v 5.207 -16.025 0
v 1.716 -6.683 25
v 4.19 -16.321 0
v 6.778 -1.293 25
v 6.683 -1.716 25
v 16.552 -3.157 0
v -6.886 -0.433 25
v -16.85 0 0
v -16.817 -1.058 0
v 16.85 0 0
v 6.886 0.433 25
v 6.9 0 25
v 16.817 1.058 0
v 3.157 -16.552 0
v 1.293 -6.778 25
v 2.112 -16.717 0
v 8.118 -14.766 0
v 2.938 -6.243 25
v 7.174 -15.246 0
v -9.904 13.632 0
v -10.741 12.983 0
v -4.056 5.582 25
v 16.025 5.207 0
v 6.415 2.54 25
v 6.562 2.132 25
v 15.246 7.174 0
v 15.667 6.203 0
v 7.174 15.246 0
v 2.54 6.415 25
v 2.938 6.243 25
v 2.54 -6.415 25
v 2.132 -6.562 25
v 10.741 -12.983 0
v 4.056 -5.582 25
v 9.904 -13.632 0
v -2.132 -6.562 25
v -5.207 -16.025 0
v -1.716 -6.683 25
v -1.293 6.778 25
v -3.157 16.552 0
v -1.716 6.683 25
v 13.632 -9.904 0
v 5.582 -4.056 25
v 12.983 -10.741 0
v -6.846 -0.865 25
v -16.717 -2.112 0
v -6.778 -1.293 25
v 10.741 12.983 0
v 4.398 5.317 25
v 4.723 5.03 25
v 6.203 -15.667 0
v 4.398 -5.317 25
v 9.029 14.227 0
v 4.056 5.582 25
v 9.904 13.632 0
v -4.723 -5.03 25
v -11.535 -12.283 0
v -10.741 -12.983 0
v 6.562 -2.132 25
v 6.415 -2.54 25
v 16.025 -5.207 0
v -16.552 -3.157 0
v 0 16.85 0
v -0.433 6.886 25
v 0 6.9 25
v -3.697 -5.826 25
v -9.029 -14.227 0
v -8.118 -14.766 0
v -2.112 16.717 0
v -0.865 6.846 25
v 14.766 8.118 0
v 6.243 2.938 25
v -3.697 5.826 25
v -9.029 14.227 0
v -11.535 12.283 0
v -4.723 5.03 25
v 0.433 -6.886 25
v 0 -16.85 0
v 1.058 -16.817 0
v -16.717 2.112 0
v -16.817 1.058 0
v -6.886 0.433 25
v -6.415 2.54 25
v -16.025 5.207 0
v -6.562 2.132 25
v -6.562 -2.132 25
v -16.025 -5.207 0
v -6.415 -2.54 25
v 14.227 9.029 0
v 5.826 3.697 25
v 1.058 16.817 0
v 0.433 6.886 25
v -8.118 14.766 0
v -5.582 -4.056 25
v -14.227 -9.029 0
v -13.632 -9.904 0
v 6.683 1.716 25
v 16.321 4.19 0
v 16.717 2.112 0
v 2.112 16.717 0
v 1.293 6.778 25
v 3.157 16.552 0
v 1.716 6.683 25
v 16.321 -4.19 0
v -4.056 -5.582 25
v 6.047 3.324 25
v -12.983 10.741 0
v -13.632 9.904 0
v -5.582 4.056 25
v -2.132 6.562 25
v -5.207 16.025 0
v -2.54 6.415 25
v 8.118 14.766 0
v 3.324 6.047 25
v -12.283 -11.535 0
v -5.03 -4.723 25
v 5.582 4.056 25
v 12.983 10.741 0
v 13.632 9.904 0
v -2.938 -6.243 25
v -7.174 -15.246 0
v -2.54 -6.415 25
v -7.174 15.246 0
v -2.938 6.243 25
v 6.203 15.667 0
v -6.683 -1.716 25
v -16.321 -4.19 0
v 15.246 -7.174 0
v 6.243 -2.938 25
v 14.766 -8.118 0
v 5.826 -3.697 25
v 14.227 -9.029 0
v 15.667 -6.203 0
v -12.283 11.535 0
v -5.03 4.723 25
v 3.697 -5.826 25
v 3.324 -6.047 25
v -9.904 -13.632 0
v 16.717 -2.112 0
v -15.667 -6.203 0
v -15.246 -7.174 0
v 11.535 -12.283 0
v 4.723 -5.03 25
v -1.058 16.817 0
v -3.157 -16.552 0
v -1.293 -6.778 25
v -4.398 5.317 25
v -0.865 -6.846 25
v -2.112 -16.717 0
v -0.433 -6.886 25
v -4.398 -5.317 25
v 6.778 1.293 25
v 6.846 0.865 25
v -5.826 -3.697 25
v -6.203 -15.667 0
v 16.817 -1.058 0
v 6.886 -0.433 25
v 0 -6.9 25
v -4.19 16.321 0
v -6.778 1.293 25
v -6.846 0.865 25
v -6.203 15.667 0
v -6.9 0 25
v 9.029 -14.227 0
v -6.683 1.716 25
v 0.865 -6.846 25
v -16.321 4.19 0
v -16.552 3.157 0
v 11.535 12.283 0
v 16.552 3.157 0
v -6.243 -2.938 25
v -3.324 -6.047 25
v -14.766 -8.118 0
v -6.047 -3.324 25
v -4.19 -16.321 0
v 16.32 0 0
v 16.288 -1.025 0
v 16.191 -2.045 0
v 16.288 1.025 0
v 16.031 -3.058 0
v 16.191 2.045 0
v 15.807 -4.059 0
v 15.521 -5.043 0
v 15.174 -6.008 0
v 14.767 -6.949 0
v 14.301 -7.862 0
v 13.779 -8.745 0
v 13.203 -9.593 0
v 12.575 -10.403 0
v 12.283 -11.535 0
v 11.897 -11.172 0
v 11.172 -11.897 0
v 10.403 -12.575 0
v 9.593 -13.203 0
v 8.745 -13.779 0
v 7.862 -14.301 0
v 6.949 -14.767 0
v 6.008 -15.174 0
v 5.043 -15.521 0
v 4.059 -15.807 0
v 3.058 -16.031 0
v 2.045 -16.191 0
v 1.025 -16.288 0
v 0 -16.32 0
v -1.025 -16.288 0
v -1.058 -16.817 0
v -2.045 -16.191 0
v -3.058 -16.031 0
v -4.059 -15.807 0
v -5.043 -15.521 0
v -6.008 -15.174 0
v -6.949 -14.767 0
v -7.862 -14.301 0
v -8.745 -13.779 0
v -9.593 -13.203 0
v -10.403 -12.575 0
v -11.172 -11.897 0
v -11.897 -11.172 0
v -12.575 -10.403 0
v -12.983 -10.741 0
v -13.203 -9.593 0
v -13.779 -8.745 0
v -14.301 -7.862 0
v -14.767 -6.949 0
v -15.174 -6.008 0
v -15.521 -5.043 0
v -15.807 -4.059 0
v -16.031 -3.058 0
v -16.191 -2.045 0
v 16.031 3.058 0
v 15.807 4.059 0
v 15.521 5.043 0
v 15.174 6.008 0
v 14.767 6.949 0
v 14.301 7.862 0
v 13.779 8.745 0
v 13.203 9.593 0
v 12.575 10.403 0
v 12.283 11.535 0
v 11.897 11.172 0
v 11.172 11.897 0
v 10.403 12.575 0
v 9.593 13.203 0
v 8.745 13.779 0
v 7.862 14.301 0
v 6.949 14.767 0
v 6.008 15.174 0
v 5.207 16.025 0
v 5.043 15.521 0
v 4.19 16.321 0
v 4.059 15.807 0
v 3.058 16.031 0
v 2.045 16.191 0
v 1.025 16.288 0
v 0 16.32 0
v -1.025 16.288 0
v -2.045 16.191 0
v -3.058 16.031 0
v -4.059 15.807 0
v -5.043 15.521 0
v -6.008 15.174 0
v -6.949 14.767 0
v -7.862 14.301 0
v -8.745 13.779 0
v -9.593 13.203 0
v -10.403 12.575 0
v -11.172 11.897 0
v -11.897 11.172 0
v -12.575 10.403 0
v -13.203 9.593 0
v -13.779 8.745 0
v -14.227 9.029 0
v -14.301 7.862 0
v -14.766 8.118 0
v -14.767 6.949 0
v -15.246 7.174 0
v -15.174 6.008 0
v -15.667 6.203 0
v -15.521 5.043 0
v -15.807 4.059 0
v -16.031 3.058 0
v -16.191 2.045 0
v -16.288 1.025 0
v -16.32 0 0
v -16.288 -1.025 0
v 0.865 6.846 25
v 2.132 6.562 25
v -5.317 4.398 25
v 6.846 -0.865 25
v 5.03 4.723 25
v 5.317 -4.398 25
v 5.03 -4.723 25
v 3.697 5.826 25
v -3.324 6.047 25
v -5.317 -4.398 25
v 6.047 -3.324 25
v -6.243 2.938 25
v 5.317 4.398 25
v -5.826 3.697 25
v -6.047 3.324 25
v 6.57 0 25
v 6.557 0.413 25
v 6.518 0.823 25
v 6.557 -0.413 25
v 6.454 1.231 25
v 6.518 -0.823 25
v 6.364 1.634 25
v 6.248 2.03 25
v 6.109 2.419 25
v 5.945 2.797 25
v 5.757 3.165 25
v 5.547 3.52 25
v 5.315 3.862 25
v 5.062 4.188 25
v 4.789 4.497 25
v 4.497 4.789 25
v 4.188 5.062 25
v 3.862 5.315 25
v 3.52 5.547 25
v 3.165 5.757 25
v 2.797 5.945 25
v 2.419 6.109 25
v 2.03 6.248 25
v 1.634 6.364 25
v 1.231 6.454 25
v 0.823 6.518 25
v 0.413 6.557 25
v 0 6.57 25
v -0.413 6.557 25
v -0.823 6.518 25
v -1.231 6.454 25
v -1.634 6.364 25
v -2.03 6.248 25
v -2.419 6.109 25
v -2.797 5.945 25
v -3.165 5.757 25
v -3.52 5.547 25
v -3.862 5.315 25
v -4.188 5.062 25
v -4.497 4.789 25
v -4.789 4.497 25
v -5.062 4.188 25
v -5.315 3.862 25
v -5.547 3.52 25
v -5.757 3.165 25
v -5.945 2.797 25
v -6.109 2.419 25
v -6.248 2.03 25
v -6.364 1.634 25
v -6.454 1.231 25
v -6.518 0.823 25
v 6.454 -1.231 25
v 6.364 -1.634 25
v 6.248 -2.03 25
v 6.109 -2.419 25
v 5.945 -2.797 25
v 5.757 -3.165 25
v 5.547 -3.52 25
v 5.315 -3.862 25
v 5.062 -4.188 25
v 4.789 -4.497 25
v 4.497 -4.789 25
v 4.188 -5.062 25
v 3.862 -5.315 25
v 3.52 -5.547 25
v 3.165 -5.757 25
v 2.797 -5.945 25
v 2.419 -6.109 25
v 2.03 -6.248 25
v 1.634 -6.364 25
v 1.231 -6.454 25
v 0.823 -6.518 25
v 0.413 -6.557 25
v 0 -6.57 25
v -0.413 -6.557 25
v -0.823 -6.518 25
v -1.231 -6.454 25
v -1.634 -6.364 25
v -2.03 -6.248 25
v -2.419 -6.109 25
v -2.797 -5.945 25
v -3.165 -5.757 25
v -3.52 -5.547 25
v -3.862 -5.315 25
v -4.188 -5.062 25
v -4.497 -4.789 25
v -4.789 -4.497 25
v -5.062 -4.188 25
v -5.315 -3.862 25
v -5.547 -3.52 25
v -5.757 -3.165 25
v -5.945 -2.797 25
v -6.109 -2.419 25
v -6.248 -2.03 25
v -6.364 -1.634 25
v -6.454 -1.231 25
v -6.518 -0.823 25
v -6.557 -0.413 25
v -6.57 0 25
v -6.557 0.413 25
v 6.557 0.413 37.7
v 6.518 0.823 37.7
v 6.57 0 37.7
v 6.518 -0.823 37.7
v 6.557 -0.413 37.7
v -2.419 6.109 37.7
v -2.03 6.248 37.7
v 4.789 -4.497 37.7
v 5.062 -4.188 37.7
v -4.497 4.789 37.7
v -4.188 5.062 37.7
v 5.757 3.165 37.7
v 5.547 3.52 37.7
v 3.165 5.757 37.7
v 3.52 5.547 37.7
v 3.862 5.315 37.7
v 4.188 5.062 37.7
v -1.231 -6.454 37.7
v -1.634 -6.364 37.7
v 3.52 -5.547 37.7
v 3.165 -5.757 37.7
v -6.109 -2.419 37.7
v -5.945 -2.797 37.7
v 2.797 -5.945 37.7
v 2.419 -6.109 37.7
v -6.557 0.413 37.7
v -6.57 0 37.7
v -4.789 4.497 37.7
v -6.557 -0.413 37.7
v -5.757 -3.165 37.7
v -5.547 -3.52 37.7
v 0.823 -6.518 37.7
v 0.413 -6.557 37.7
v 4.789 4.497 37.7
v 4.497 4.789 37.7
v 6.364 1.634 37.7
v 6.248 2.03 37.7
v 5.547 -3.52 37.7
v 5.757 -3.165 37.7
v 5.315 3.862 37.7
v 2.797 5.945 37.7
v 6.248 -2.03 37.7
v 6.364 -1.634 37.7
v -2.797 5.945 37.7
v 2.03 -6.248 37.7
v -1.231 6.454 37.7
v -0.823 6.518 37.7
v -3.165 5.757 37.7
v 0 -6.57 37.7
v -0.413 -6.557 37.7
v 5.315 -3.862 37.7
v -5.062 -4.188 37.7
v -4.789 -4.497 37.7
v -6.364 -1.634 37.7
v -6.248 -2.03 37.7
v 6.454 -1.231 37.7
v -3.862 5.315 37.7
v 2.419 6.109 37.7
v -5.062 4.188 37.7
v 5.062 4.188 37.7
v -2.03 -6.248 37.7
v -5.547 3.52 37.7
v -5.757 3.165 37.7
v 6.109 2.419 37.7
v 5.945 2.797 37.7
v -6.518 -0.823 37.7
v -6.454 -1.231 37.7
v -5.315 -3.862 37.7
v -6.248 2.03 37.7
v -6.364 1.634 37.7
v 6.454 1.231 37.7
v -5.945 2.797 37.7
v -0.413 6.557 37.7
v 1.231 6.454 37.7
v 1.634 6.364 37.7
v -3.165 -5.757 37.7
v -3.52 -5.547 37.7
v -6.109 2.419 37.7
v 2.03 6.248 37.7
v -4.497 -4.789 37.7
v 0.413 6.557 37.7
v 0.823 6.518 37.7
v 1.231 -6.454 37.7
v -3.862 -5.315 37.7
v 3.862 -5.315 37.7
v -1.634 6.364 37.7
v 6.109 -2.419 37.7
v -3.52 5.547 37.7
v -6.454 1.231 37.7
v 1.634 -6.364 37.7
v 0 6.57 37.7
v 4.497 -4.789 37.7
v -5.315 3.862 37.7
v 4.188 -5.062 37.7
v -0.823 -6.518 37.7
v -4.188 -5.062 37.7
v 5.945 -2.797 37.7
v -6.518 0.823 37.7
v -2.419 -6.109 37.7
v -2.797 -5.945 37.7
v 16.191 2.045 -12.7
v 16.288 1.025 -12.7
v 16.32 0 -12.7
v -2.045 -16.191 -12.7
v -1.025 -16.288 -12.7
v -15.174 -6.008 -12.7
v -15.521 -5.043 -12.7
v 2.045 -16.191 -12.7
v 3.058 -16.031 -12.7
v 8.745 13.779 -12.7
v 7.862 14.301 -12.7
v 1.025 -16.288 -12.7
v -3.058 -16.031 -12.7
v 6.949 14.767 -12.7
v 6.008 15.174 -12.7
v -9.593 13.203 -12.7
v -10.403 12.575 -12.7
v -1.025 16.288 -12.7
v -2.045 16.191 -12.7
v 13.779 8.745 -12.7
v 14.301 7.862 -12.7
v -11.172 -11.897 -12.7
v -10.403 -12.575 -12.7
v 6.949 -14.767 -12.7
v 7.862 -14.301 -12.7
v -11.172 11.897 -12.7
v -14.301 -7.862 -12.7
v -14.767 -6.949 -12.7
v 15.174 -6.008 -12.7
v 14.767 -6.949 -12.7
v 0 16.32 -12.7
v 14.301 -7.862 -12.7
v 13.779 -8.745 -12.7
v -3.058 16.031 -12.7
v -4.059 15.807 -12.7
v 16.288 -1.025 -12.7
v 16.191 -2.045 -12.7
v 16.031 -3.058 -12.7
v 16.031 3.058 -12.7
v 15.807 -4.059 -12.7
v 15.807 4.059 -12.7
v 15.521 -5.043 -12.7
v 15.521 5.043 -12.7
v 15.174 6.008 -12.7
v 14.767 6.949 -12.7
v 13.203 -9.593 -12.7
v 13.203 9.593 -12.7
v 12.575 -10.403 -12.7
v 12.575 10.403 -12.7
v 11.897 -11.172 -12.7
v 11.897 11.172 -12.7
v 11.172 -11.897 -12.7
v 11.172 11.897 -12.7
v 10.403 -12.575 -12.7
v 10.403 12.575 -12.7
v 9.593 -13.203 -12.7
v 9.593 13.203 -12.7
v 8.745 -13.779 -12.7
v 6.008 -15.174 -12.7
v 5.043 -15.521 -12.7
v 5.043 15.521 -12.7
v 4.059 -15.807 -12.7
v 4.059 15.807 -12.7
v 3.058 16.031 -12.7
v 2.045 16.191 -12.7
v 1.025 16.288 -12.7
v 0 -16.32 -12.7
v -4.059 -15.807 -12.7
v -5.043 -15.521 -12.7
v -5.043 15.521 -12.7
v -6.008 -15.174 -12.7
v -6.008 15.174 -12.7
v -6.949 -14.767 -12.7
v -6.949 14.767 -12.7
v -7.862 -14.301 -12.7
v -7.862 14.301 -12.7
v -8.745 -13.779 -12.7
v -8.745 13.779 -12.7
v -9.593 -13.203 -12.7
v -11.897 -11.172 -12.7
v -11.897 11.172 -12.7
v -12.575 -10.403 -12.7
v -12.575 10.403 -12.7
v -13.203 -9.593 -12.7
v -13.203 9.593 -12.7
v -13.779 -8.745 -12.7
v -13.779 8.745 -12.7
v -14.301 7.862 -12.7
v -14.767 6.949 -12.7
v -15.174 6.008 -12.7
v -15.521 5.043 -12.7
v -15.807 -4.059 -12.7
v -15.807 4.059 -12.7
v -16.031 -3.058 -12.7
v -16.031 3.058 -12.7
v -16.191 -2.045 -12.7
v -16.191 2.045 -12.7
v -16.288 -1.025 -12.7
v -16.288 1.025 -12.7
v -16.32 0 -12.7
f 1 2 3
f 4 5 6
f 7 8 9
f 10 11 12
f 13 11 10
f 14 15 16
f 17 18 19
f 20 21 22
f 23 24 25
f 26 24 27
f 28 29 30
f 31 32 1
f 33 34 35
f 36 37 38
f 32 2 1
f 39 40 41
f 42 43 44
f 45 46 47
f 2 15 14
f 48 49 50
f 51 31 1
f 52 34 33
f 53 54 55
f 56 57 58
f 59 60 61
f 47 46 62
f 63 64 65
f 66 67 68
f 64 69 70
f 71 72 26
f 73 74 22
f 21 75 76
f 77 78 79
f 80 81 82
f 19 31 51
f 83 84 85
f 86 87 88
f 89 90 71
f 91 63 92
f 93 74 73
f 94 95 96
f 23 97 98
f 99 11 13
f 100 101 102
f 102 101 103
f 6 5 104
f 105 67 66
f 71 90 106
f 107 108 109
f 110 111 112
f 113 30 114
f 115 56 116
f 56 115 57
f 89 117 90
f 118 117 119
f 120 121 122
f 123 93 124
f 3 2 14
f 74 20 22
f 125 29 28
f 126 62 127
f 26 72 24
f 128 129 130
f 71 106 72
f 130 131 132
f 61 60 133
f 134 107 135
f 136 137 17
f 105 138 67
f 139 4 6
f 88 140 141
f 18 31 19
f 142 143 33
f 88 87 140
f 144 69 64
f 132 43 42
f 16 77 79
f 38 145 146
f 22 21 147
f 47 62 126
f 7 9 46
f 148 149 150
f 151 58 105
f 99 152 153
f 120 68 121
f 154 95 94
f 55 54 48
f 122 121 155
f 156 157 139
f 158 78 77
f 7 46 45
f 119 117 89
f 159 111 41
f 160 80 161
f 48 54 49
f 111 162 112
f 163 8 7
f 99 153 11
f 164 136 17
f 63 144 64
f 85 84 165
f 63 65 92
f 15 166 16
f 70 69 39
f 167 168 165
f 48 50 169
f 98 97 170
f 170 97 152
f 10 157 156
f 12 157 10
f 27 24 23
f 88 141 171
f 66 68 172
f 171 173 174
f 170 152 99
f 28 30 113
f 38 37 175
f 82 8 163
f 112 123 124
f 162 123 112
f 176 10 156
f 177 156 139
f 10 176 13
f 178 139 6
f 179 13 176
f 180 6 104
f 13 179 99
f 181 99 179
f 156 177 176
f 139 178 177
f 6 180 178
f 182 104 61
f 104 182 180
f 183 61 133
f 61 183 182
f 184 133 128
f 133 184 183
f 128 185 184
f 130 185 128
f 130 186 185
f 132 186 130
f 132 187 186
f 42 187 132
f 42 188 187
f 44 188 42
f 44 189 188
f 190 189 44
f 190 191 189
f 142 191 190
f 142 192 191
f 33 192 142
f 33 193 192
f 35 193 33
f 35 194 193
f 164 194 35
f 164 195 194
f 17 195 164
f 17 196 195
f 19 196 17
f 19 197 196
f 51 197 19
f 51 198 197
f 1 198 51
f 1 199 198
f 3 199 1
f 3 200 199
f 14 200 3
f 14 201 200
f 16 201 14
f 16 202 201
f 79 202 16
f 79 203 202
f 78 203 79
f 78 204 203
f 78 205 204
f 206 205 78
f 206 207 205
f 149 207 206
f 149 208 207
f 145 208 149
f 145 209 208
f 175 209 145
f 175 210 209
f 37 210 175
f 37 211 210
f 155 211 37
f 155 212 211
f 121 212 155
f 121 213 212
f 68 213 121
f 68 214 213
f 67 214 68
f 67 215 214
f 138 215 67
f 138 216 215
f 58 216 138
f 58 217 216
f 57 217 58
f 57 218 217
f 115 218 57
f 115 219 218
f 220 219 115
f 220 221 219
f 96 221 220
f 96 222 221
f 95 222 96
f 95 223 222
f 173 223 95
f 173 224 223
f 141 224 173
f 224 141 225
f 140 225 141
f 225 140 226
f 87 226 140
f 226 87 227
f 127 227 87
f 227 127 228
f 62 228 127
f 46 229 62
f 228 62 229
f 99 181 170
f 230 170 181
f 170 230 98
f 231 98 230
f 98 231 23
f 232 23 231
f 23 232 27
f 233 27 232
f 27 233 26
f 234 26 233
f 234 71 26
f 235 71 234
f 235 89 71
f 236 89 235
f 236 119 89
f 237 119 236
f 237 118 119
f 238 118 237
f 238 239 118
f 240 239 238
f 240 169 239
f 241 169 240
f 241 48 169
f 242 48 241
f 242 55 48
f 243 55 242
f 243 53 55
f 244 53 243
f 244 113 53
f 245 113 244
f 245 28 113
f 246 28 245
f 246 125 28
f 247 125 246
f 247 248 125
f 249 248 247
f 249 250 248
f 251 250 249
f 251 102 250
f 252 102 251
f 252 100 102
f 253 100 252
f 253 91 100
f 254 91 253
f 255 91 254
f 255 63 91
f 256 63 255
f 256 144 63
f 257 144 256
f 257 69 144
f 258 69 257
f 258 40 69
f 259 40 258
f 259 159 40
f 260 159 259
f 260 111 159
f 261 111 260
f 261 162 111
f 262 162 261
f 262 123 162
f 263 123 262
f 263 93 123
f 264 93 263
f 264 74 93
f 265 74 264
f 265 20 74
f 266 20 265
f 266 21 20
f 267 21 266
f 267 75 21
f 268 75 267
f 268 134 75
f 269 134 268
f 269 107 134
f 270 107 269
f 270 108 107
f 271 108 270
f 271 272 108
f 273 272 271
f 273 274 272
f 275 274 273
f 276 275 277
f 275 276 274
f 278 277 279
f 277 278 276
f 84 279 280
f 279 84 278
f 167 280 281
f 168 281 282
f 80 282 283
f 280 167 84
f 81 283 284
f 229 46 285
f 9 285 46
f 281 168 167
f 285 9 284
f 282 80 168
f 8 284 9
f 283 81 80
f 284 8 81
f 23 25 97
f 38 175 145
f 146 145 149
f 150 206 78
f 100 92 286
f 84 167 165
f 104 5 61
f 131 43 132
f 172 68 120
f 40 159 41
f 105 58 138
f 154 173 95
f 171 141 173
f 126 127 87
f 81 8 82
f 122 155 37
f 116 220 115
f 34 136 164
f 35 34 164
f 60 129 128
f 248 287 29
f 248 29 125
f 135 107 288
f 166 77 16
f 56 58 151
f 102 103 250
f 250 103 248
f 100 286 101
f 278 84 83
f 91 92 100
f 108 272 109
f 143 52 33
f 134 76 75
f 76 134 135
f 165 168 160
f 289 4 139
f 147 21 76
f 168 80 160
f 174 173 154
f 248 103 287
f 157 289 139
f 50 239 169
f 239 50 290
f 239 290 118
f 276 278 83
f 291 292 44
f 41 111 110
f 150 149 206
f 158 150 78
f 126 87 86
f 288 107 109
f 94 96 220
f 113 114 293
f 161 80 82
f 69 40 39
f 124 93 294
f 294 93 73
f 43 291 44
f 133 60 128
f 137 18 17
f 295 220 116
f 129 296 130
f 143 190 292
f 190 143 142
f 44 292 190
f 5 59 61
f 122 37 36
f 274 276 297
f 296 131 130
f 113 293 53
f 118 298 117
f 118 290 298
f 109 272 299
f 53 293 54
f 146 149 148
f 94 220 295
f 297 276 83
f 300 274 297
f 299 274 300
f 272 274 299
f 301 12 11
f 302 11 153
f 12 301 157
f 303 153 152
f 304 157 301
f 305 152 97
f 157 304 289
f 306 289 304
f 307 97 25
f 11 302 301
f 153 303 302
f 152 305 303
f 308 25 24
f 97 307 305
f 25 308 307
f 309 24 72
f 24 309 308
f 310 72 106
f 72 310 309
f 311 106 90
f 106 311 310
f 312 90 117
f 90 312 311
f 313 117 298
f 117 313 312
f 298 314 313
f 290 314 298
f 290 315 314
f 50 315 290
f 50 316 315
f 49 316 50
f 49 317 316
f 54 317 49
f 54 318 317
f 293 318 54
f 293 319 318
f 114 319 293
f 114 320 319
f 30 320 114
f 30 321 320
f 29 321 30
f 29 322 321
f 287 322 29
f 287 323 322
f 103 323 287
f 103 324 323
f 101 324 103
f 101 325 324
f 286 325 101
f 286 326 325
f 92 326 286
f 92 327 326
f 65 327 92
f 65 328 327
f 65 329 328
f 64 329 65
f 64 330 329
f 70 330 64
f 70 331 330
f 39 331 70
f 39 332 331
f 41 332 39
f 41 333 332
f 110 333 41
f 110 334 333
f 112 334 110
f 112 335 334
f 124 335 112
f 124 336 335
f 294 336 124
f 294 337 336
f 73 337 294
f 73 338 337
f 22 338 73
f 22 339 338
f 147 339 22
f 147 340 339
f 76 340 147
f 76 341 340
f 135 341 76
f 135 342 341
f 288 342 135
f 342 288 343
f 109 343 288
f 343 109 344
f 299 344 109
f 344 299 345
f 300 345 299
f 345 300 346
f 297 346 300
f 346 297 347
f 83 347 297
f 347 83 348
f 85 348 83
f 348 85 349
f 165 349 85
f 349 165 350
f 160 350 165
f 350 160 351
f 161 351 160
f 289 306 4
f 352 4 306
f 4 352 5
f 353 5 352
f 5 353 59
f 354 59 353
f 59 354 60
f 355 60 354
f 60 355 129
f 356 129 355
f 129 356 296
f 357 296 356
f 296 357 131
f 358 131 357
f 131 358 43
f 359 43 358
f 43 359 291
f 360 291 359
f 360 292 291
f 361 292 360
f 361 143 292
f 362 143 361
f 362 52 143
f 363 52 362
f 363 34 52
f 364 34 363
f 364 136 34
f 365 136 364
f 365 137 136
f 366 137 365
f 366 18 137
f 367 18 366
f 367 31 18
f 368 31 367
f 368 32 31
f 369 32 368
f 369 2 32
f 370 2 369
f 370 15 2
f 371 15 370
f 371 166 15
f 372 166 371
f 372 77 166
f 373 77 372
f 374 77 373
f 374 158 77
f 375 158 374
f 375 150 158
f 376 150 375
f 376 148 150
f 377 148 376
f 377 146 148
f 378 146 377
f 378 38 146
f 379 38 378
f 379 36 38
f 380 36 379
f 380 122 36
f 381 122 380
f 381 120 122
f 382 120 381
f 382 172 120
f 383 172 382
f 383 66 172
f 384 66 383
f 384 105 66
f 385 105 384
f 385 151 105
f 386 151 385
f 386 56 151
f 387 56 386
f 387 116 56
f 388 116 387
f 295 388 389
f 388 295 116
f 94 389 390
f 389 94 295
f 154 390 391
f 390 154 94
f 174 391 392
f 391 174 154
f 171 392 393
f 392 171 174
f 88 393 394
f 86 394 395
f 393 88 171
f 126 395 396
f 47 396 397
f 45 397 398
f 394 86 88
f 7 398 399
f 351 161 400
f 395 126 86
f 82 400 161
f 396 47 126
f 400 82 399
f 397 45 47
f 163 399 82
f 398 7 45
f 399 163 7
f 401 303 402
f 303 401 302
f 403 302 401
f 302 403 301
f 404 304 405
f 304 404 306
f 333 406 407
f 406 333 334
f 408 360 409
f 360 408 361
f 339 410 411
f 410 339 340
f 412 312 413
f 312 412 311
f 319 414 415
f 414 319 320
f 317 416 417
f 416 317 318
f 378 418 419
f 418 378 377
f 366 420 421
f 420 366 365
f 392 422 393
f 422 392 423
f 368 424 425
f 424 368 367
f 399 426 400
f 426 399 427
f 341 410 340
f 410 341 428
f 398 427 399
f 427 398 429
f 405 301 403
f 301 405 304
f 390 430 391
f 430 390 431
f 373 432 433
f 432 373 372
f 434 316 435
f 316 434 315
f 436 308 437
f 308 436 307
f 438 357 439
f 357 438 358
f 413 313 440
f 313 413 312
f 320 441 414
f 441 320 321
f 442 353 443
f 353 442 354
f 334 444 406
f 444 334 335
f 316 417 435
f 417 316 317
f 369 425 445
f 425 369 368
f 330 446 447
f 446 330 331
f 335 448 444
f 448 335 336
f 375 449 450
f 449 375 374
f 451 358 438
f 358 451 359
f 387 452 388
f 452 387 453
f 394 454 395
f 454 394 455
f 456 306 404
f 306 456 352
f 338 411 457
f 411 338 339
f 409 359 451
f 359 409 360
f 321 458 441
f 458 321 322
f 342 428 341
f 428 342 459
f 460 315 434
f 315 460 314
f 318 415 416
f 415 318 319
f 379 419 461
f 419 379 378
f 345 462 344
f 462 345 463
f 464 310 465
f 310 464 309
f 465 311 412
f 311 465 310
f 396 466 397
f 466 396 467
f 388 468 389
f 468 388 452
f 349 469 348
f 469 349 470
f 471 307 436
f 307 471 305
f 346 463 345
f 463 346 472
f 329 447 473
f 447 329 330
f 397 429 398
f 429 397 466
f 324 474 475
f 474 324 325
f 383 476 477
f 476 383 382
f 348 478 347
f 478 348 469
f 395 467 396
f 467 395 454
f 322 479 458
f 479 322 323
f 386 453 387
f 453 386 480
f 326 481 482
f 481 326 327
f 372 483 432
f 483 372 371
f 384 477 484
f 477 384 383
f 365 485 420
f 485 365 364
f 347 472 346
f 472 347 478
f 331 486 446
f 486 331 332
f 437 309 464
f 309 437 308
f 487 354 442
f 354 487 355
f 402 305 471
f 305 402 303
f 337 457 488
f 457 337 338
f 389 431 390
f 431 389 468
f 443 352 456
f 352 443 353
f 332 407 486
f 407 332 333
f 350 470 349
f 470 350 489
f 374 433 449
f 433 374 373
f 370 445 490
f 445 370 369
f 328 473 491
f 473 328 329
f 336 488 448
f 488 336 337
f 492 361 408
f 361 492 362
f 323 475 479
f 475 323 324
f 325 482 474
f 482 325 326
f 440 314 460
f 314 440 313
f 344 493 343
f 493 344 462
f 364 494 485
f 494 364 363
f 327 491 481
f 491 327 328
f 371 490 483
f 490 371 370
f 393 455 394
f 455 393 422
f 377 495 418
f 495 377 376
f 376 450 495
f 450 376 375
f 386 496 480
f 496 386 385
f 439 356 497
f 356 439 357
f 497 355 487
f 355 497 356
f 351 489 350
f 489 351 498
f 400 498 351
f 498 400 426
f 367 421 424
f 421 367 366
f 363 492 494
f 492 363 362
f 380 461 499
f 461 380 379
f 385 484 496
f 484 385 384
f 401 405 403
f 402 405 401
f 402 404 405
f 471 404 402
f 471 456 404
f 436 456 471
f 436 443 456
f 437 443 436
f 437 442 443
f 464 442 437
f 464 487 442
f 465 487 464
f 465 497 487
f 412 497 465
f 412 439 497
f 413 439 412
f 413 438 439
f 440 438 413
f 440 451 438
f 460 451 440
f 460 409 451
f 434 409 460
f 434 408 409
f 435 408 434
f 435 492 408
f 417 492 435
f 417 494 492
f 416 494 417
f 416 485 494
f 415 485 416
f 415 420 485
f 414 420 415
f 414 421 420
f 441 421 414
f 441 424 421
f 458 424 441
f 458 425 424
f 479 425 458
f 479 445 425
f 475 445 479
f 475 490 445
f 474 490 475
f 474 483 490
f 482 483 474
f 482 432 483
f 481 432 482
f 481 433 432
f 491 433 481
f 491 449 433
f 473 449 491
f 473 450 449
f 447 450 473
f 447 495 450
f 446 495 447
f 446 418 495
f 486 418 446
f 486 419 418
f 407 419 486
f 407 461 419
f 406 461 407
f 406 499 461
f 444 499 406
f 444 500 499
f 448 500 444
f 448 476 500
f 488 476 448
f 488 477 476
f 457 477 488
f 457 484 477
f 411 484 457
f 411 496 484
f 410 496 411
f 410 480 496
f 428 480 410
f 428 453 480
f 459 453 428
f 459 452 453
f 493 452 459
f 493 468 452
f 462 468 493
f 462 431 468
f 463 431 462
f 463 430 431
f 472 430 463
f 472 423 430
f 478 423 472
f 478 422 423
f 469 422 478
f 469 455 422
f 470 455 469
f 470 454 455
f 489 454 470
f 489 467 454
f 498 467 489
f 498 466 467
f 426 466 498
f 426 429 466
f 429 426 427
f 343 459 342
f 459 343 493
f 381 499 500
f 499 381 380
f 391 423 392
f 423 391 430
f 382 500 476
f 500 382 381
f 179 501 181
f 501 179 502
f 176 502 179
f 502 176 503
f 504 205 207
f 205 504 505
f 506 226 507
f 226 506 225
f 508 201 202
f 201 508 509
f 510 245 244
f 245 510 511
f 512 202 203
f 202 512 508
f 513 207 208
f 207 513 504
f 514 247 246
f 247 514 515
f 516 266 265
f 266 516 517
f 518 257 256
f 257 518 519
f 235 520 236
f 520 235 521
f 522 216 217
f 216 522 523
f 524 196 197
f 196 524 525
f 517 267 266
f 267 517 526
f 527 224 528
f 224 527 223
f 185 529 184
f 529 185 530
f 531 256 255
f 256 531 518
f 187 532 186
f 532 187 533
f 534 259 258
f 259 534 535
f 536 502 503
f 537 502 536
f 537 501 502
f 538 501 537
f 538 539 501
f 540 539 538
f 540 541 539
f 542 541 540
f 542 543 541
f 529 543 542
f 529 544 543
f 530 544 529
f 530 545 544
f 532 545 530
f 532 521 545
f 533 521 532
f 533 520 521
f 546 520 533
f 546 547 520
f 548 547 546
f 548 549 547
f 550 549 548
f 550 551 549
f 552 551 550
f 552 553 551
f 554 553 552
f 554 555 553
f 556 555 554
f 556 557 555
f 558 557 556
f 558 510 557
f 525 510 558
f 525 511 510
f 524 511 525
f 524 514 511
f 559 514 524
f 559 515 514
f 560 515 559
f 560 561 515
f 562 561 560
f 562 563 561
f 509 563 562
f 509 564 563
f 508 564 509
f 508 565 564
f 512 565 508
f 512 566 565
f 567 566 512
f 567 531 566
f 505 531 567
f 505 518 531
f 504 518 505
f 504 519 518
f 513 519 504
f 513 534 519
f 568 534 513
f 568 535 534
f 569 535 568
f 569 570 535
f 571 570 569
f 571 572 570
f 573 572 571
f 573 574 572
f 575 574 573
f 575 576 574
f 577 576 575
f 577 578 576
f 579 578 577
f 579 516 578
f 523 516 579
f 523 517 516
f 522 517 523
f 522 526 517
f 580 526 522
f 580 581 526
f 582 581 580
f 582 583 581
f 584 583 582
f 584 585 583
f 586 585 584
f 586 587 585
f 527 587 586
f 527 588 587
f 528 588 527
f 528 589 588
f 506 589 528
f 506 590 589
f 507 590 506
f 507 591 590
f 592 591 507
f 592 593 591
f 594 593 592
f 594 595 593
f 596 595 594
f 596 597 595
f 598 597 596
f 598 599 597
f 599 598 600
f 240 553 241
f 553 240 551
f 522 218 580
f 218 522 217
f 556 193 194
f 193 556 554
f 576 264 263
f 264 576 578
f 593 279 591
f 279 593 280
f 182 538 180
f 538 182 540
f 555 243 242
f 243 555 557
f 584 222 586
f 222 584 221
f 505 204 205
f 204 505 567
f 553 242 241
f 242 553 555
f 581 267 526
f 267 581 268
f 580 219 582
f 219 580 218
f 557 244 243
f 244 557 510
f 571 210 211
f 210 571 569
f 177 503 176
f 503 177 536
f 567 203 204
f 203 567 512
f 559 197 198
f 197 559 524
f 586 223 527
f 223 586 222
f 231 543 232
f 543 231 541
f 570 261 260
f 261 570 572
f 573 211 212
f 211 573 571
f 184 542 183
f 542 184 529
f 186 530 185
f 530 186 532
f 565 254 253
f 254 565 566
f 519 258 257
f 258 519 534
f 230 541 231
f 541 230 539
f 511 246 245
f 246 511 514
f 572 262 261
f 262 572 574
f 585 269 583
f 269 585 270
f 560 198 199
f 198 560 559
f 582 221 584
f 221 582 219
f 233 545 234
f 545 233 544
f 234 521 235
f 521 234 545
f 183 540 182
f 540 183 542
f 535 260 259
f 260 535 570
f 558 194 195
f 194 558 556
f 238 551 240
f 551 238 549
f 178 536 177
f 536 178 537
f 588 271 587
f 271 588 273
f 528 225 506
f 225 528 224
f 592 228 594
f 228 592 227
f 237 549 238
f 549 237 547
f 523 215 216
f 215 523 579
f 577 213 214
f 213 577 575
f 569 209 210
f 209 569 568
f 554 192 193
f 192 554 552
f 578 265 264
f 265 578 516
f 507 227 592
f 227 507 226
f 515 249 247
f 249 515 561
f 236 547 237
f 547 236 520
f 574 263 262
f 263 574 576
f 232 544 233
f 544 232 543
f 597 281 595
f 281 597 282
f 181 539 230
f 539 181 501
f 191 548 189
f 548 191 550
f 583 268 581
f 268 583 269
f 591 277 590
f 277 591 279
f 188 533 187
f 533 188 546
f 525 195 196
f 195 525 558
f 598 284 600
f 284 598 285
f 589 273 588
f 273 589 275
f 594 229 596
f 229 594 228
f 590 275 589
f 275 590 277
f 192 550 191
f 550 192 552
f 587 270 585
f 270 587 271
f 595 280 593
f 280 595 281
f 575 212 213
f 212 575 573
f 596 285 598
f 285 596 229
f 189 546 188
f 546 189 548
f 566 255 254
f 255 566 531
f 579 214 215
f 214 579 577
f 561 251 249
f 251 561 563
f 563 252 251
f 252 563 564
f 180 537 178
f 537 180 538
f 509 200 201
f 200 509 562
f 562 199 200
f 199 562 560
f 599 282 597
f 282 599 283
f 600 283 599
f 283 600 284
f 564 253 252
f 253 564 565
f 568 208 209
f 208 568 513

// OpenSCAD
//All measurements are in millimeters.

//Size of larger tube?
tube_1 = 33.7; //[13.8:BT-5, 18.7:BT-20, 24.8:BT-50, 33.7:BT-55, 34.2:BT-56, 41.6:BT-60, 56.3:BT-70, 66.04:BT-80, 100:BT-101]

//Size of smaller tube?
tube_2 = 13.8; //[13.8:BT-5, 18.7:BT-20, 24.8:BT-50, 33.7:BT-55, 34.2:BT-56, 41.6:BT-60, 56.3:BT-70, 66.04:BT-80, 100:BT-101]

//How long do you want the taper to be?
taper_length = 25;

//Diameter of the hole through the center?  Use "0" for no hole.  Must be smaller than diameter of the small tube.
hole = 0;

wall_1 = tube_1 == 13.8 || tube_1 == 18.7 || tube_1 == 24.8 ? 0.33 : 0.53;

wall_2 = tube_2 == 13.8 || tube_2 == 18.7 || tube_2 == 24.8 ? 0.33 : 0.53;

difference(){

union(){
    
cylinder(h=taper_length, r1=tube_1/2, r2=tube_2/2, center=false, $fn=100);

translate([0,0,taper_length]) cylinder(h=12.7,r=tube_2/2-wall_2, center=false, $fn=100);

translate([0,0,-12.7]) cylinder(h=12.7,r=tube_1/2-wall_1, center=false, $fn=100);
}

translate([0,0,-12.7]) cylinder(h=taper_length+25.4, r=hole/2, center=false, $fn=100);    
}
